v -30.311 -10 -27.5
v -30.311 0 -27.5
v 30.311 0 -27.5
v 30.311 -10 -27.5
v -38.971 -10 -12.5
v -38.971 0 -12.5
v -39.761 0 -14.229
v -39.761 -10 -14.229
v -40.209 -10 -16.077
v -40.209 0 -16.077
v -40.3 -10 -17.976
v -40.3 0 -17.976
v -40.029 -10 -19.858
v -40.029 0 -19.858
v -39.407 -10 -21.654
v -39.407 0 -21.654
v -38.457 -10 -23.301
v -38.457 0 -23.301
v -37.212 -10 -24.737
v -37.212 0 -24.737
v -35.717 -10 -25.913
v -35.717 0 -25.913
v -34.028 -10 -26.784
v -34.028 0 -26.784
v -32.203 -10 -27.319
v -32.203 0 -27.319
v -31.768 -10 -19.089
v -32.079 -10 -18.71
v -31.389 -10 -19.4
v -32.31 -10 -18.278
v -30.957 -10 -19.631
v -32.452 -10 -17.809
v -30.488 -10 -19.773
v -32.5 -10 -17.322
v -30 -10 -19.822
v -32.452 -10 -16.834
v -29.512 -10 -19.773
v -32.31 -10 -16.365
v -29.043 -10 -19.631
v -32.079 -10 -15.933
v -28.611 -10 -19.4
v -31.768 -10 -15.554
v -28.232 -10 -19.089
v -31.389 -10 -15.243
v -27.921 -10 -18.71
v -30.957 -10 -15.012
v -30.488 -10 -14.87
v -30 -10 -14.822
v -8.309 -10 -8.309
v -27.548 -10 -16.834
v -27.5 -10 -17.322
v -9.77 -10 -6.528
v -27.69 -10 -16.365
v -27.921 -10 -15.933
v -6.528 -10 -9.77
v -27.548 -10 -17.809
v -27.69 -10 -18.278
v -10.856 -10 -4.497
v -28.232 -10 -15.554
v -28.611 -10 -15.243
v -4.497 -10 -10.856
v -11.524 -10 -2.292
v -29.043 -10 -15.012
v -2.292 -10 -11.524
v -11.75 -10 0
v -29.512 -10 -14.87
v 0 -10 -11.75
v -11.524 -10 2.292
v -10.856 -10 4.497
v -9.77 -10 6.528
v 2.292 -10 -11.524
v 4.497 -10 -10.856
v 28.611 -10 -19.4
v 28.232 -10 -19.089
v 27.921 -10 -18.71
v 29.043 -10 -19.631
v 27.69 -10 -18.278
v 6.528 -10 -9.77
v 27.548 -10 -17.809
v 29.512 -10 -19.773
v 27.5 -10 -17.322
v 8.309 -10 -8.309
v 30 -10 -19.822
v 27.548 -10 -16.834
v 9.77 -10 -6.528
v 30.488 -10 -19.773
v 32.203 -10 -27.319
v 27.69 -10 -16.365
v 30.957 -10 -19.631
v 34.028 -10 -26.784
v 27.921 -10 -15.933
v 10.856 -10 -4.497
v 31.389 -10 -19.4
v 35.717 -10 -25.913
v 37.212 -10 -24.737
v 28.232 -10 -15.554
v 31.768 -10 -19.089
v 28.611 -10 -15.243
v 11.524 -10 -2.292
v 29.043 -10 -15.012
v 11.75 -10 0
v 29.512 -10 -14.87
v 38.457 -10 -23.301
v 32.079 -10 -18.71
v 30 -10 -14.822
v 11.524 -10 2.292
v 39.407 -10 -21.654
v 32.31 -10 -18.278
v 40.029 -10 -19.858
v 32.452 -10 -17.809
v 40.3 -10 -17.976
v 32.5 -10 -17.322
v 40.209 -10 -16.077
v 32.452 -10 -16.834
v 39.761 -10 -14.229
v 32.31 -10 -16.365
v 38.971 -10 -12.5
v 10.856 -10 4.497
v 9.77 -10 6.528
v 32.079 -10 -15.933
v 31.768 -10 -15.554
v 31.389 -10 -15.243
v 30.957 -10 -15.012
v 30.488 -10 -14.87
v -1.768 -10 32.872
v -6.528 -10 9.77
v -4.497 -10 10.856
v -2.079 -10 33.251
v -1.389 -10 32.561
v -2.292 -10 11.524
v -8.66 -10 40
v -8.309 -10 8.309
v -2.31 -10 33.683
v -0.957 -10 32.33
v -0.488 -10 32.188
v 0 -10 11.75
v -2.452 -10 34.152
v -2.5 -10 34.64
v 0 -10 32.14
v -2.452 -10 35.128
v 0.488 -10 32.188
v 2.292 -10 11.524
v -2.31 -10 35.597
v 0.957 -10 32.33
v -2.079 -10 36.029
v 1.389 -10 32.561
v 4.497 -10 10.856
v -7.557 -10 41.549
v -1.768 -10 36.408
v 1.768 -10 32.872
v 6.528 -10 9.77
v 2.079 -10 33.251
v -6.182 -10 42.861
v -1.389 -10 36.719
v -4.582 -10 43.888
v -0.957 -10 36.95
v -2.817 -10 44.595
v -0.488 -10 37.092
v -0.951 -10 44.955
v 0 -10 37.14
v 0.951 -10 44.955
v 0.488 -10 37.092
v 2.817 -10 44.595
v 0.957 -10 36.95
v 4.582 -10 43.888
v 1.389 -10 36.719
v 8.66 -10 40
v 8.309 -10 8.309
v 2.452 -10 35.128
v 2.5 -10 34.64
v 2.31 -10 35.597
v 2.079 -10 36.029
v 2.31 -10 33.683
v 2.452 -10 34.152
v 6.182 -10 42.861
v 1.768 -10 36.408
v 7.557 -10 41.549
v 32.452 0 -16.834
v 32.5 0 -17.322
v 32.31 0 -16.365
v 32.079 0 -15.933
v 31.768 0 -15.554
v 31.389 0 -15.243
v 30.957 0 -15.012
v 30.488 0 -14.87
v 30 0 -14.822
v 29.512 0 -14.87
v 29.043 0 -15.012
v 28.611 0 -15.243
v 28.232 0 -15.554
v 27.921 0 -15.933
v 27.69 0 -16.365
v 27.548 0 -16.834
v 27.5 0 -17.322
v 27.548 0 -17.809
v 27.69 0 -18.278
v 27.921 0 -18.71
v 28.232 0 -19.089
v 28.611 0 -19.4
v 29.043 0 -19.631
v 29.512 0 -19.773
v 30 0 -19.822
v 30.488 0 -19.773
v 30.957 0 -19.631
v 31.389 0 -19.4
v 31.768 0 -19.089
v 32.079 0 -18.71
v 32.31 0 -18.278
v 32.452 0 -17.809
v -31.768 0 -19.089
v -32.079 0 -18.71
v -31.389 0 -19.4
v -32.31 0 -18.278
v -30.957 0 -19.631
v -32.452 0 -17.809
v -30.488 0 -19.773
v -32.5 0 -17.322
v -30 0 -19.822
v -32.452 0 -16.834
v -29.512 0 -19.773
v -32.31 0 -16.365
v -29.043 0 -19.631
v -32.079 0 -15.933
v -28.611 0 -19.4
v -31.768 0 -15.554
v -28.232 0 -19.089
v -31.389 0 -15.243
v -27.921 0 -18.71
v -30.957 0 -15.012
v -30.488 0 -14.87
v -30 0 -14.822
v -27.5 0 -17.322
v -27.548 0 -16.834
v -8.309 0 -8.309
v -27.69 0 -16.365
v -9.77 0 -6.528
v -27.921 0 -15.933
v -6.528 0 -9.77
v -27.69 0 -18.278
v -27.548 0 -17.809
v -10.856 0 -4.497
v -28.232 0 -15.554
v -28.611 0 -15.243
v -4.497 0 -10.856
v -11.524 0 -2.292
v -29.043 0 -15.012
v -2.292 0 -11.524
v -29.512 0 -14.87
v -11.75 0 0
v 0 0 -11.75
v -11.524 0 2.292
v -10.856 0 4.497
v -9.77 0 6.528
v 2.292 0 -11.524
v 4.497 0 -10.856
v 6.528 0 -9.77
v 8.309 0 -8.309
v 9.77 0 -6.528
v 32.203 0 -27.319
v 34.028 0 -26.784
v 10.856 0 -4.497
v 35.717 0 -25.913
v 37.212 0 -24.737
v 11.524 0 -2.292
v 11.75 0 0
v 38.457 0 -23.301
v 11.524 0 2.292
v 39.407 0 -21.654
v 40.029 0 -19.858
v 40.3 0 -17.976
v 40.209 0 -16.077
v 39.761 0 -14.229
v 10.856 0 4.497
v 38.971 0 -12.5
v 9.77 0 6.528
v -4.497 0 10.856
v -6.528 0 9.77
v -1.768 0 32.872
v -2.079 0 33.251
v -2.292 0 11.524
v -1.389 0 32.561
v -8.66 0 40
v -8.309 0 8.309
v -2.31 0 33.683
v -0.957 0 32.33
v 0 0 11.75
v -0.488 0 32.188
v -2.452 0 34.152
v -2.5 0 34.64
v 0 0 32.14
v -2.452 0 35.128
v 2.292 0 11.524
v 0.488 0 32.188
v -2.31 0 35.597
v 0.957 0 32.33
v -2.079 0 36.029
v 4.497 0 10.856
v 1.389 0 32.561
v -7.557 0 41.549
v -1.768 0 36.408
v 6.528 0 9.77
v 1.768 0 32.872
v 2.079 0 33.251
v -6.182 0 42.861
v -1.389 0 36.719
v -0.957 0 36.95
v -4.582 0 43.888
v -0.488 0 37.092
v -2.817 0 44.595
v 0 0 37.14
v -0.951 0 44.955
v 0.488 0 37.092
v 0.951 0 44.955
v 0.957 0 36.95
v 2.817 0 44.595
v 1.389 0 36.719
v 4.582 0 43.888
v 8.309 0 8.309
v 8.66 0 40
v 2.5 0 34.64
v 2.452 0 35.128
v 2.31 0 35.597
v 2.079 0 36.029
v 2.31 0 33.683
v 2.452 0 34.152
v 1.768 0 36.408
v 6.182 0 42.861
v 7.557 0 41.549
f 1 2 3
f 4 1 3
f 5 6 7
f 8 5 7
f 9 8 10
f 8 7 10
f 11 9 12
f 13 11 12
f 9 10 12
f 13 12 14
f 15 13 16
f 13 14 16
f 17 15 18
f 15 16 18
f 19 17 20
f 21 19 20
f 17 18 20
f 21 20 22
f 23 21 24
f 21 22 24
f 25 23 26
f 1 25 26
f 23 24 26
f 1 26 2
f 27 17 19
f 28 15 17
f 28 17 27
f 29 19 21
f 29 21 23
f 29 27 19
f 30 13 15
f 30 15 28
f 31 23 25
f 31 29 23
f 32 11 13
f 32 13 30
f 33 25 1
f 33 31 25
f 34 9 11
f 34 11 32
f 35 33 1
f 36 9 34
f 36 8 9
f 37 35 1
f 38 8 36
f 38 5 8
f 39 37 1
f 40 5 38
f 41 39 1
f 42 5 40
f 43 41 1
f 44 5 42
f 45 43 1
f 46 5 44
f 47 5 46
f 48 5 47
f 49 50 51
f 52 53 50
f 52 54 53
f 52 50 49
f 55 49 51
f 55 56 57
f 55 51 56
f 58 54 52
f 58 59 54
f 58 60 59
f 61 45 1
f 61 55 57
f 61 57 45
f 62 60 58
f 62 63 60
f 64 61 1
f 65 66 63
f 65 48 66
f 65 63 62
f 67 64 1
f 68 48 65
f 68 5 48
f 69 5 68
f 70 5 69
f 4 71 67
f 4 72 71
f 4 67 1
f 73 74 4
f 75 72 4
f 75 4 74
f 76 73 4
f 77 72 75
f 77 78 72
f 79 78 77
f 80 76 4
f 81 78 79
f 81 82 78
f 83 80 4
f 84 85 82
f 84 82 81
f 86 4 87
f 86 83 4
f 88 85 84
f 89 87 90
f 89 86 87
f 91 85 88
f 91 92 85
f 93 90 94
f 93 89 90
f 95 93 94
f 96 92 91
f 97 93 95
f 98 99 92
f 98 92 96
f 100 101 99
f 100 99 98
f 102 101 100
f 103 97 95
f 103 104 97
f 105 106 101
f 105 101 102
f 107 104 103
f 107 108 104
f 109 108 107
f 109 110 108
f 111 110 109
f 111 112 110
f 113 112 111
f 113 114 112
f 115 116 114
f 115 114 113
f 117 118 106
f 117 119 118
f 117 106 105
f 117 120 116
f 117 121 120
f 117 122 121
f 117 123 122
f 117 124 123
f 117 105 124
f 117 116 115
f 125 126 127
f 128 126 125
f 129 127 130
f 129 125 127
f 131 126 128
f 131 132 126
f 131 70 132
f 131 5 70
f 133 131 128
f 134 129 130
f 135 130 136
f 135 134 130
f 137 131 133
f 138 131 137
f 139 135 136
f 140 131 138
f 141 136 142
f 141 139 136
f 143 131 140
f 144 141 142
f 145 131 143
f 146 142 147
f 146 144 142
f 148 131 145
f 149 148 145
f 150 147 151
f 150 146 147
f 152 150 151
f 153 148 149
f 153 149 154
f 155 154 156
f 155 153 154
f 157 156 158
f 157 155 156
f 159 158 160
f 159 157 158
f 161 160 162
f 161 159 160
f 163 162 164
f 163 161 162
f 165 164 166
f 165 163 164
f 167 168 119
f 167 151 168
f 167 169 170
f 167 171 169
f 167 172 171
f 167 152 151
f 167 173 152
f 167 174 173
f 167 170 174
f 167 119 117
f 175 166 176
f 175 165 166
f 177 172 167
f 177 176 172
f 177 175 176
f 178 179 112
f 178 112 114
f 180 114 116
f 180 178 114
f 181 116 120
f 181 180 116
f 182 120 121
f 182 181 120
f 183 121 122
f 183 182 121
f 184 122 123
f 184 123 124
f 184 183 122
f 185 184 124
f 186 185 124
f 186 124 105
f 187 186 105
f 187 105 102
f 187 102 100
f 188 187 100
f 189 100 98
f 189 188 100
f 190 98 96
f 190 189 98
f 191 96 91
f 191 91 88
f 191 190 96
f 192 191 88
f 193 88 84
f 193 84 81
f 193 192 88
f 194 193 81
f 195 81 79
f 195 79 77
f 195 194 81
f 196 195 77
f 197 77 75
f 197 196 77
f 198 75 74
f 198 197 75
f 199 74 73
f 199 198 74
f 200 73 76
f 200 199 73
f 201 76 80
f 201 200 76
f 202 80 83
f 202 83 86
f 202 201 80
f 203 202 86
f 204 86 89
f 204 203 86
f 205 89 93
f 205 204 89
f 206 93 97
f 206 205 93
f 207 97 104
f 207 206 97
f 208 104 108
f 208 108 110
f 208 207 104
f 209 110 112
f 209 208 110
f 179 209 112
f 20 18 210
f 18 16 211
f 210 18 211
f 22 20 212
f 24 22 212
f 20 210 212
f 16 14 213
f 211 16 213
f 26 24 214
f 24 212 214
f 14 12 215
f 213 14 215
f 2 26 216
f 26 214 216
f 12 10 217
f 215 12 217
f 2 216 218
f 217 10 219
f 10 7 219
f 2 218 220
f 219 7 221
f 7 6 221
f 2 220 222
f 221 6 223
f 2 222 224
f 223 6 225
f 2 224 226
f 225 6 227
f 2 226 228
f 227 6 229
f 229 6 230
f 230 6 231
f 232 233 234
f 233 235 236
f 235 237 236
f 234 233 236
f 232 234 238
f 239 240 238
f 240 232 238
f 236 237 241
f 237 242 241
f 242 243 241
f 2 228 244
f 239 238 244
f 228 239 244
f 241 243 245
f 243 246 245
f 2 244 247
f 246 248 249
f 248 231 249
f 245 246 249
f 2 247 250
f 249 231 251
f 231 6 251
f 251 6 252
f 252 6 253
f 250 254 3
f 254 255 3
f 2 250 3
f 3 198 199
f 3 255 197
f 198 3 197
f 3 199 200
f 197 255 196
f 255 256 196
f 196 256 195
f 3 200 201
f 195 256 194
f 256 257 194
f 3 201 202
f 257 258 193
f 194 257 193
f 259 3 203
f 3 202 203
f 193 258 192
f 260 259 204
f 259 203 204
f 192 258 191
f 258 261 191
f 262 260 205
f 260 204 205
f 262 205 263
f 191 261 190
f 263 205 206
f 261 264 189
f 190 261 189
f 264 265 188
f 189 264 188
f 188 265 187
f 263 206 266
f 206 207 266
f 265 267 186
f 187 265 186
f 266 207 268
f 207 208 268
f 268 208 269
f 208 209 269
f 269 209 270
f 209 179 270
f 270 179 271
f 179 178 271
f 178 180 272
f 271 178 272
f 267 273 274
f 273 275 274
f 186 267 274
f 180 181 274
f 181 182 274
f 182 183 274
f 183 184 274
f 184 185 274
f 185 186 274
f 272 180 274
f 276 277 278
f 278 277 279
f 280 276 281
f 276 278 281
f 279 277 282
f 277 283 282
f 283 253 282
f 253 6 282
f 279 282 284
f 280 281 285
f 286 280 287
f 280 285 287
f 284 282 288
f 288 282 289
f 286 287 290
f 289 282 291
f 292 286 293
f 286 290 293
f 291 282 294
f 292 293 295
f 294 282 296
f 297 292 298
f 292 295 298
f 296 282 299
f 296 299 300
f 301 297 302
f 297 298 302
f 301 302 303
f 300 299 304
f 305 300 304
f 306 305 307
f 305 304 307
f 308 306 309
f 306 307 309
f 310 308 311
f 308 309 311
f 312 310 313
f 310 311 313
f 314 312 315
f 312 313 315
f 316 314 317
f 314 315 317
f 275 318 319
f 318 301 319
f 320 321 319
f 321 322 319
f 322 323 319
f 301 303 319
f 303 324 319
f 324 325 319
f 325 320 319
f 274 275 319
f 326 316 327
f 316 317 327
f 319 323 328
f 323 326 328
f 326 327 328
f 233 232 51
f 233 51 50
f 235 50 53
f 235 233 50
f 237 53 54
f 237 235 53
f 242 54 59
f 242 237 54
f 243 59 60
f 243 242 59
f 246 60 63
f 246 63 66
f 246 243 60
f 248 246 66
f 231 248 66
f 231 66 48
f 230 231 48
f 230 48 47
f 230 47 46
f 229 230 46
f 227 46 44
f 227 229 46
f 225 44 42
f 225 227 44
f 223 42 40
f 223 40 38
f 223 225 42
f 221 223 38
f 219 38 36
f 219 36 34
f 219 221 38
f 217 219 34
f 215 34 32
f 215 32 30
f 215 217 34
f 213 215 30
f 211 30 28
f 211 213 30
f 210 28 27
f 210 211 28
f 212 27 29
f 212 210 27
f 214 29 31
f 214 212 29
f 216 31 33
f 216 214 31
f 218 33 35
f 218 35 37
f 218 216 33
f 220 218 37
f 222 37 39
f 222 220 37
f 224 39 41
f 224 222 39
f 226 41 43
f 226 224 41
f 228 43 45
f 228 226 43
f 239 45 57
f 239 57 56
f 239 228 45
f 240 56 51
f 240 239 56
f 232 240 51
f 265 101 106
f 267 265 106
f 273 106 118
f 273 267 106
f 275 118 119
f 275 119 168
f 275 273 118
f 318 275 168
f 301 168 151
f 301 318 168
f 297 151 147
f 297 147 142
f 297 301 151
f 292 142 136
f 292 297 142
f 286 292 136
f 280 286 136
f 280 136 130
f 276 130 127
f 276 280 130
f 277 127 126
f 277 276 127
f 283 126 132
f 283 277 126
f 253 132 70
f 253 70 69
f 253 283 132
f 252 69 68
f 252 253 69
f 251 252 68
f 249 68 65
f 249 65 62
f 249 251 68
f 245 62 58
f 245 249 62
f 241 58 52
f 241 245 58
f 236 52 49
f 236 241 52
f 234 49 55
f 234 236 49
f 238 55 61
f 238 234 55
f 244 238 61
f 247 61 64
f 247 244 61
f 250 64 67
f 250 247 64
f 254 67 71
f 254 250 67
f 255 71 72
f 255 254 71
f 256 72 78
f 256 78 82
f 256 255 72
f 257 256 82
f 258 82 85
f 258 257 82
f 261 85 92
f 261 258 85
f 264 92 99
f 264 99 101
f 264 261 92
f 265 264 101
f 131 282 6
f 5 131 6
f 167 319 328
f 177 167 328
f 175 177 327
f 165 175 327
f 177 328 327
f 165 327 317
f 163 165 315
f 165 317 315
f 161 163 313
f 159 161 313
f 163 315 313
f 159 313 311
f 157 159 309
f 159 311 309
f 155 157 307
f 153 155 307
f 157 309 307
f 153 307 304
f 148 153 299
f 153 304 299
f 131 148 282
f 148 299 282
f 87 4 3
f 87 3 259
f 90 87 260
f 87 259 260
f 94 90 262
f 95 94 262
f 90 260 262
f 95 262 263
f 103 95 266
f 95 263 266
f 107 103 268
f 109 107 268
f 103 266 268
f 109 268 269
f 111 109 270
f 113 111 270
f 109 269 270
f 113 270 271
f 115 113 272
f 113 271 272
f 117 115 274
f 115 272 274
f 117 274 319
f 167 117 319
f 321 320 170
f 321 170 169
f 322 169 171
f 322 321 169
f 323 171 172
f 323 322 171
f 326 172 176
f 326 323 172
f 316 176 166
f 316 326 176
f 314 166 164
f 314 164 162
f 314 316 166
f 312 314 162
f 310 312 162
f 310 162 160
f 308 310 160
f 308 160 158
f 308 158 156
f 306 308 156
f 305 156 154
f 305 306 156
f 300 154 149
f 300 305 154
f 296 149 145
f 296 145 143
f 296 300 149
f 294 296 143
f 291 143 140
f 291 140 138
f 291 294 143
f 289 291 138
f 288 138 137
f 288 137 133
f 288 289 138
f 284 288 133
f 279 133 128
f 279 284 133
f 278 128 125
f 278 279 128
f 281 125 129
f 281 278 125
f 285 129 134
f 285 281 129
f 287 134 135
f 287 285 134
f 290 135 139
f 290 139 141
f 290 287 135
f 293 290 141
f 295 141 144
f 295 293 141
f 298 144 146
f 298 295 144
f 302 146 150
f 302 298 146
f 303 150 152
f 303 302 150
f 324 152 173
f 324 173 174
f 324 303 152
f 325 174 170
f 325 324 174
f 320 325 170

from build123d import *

# Parameters (mm, degrees)
F0_R     = 2.5
F0_R_2   = 11.75
F1_DEPTH = 10


with BuildPart() as f1:
    # F0 (on Front) → F1 (new body)
    with BuildSketch(Plane.XZ):
        with BuildLine():
            Line((-30.310889, -27.5), (30.310889, -27.5))
            ThreePointArc((30.310889, -27.5), (38.971143, -22.5), (38.971143, -12.5))
            Line((38.971143, -12.5), (8.660254, 40))
            ThreePointArc((8.660254, 40), (0, 45), (-8.660254, 40))
            Line((-8.660254, 40), (-38.971143, -12.5))
            ThreePointArc((-38.971143, -12.5), (-38.971143, -22.5), (-30.310889, -27.5))
        make_face()
        with Locations((-30, -17.321524)):
            Circle(F0_R, mode=Mode.SUBTRACT)
        with Locations((30, -17.321524)):
            Circle(F0_R, mode=Mode.SUBTRACT)
        Circle(F0_R_2, mode=Mode.SUBTRACT)
        with Locations((0, 34.64)):
            Circle(F0_R, mode=Mode.SUBTRACT)
    extrude(amount=F1_DEPTH)


solid = f1.part
